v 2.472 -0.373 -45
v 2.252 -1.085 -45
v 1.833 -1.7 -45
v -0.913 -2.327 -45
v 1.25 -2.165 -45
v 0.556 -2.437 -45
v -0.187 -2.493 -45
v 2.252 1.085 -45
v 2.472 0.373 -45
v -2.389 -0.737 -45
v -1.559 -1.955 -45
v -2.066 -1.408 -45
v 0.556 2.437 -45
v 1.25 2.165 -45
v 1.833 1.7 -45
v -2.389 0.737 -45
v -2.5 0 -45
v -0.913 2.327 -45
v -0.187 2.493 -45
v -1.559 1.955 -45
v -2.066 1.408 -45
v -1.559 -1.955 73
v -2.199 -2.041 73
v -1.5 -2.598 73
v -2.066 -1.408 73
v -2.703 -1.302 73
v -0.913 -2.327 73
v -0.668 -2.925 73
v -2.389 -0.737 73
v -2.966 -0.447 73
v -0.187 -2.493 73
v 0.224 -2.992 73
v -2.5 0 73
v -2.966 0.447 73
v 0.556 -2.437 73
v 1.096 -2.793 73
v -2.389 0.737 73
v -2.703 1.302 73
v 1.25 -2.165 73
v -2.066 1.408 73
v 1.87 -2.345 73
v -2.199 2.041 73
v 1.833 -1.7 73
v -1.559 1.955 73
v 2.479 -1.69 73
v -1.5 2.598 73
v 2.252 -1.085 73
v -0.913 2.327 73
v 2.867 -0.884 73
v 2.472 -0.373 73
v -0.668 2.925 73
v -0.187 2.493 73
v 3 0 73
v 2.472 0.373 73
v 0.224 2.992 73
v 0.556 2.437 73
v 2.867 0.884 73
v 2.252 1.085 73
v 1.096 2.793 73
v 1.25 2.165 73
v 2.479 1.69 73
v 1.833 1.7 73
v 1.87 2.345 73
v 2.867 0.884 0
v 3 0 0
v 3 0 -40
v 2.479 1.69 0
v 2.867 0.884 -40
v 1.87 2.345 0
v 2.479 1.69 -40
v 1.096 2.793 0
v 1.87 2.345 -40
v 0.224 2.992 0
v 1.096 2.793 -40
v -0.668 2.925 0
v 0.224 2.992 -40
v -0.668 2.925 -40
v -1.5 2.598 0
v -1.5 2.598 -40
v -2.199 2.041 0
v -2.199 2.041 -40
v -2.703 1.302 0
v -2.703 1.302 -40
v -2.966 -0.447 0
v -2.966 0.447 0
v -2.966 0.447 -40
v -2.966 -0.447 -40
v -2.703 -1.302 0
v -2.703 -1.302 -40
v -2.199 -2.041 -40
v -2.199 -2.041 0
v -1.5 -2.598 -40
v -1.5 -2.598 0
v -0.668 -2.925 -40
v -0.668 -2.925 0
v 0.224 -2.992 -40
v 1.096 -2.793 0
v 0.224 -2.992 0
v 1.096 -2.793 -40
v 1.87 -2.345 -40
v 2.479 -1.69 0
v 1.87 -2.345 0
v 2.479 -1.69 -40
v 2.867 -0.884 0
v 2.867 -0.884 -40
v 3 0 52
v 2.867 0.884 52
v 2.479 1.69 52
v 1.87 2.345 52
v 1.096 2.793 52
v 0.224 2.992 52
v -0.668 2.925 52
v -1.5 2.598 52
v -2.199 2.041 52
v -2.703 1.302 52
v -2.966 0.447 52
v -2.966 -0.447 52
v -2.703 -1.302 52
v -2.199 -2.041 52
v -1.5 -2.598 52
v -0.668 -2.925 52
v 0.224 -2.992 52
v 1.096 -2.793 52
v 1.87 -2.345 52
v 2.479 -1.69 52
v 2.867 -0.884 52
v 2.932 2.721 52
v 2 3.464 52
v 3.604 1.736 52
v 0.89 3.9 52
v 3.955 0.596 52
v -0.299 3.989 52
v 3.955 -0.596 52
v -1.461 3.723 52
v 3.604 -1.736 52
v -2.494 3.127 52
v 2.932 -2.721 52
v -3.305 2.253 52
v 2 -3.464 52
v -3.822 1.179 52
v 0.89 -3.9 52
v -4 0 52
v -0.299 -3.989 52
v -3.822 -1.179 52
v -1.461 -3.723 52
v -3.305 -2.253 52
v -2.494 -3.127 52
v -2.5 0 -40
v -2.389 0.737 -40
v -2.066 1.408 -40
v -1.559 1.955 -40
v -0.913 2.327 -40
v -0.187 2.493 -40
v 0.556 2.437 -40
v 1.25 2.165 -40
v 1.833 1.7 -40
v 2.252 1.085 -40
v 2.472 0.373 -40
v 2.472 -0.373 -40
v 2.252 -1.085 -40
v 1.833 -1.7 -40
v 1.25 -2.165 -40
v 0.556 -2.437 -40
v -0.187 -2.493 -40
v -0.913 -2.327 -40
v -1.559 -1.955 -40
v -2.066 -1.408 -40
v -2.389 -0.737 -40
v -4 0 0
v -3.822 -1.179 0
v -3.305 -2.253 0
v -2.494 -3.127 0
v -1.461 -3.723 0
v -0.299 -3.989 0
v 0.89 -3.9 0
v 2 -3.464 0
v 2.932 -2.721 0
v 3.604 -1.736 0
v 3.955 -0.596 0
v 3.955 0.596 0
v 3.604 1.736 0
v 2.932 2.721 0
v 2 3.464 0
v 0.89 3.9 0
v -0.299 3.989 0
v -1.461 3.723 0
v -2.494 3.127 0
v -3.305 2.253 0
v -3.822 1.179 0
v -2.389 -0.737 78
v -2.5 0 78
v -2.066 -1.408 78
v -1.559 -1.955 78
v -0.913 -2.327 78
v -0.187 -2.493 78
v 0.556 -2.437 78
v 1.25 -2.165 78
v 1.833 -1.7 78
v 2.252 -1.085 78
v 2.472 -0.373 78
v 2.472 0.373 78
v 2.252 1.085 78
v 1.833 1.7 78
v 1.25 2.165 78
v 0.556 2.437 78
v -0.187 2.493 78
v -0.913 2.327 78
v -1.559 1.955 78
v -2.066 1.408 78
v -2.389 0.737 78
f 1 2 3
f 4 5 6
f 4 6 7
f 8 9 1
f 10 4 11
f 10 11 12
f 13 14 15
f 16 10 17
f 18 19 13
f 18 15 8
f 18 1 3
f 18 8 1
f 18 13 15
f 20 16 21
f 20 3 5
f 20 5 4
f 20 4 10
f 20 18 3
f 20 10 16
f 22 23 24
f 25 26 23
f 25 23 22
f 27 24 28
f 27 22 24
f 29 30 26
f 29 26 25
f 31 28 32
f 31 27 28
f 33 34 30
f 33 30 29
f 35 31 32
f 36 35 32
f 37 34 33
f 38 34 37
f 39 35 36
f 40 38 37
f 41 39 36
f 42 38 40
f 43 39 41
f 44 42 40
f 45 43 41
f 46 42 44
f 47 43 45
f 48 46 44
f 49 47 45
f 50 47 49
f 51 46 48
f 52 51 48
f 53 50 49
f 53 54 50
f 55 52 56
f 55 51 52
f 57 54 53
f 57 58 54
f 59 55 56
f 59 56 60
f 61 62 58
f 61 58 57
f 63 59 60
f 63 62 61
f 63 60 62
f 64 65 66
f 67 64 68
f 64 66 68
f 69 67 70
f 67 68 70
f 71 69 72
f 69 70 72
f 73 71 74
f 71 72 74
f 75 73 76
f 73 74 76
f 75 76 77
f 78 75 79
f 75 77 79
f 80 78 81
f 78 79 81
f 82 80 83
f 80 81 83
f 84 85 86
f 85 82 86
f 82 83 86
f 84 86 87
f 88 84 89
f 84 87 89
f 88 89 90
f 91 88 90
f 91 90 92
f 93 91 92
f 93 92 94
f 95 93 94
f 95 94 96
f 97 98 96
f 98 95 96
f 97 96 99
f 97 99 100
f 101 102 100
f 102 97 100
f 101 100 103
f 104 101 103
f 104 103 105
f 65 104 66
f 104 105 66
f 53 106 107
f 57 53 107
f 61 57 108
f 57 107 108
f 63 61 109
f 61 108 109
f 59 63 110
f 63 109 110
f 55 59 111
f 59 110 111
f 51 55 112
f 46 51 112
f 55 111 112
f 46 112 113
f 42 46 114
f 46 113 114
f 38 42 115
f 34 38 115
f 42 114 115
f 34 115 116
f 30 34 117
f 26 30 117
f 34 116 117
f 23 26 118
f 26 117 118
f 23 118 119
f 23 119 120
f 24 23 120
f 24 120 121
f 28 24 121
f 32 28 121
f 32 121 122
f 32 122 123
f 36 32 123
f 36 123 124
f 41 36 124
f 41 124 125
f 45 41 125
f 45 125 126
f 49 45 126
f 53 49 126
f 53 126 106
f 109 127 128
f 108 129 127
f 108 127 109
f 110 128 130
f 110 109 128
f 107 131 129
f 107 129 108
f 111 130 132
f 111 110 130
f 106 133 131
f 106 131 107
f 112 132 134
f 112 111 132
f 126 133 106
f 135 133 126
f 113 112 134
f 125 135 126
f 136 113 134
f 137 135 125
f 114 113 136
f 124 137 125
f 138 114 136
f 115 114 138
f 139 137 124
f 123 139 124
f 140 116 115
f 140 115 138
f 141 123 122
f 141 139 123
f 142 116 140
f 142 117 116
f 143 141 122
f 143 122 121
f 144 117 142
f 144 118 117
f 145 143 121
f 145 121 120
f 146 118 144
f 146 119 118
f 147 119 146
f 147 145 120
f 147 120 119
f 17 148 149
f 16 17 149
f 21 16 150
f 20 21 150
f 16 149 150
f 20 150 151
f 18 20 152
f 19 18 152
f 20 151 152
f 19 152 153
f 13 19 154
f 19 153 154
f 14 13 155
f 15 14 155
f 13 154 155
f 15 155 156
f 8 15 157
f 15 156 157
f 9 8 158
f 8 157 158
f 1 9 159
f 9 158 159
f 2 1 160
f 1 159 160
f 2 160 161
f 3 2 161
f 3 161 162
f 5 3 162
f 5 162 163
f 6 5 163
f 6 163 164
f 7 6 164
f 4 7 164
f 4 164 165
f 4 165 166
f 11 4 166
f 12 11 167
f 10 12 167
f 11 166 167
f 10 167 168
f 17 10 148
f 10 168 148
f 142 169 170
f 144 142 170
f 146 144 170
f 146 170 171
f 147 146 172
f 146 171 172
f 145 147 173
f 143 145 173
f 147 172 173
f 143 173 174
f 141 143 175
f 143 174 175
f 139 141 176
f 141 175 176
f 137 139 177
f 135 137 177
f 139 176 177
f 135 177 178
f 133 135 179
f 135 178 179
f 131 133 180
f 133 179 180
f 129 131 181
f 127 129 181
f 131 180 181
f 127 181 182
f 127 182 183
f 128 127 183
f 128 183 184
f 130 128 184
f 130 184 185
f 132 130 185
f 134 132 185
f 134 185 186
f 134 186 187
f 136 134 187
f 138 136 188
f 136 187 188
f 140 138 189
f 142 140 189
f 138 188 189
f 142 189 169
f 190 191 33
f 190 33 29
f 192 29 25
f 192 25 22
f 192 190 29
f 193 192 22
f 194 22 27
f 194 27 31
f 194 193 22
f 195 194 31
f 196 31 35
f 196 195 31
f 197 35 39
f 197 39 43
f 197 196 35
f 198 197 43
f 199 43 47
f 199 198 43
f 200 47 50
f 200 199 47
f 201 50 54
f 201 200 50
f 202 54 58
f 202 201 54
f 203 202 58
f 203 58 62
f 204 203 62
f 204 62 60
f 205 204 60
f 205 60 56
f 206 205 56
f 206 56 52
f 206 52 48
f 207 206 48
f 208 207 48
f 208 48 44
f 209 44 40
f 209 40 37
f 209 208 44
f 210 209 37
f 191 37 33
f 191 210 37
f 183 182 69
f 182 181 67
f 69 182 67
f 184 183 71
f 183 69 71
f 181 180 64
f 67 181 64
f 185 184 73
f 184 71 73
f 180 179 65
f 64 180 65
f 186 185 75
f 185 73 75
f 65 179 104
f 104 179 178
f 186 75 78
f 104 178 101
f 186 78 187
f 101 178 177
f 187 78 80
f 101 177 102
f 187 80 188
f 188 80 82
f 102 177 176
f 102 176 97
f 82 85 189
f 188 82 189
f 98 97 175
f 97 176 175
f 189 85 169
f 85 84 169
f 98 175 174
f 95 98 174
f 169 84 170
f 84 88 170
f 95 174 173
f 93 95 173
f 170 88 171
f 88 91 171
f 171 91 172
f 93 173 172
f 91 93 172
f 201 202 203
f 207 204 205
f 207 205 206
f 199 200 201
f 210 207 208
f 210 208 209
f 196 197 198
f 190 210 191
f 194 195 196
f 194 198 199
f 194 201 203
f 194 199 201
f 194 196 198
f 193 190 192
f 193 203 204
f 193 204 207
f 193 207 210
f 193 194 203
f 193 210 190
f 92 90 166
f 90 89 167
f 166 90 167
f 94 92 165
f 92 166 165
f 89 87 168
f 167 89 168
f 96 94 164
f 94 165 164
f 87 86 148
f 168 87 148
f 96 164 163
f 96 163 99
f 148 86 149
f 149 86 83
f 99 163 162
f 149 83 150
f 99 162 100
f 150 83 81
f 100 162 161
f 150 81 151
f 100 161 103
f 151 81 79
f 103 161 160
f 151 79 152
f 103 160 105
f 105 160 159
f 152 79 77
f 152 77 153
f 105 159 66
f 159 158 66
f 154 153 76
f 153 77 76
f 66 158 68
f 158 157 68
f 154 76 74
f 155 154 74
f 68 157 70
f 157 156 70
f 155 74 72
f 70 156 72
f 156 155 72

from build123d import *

# Parameters (mm, degrees)
SKETCH_1_R           = 4
EXTRUDE_1_DEPTH      = 52
EXTRUDE_2_DEPTH      = 21
EXTRUDE_2_DEPTH_BACK = 92
SKETCH_2_R           = 3
SKETCH_3_R           = 2.5
EXTRUDE_3_DEPTH      = 5
EXTRUDE_START        = 5
SKETCH_4_R           = 2.5
EXTRUDE_4_DEPTH      = 5


with BuildPart() as part:
    # 草图1 → 凸台-拉伸1 (new body)
    with BuildSketch(Plane.XY):
        with Locations(Location((0, 0, 0), (0, 0, 180))):
            Circle(SKETCH_1_R)
    extrude(amount=EXTRUDE_1_DEPTH)

    # 草图2 → 凸台-拉伸2 (add, two sides: drawn at the far end of the back side and taken through both)
    with BuildSketch(Plane.XY.offset(52).offset(-EXTRUDE_2_DEPTH_BACK)):
        Circle(SKETCH_2_R)
    extrude(amount=EXTRUDE_2_DEPTH + EXTRUDE_2_DEPTH_BACK)

    # 草图3 → 凸台-拉伸3 (add)
    with BuildSketch(Plane(origin=(0, 0, -40), x_dir=(-1, 0, 0), z_dir=(0, 0, -1))):
        Circle(SKETCH_3_R)
    extrude(amount=EXTRUDE_3_DEPTH)

    # 草图4 → 凸台-拉伸4 (add)
    with BuildSketch(Plane.XY.offset(73).offset(EXTRUDE_START)):
        with Locations(Location((0, 0, 0), (0, 0, 180))):
            Circle(SKETCH_4_R)
    extrude(amount=-EXTRUDE_4_DEPTH)


solid = part.part
